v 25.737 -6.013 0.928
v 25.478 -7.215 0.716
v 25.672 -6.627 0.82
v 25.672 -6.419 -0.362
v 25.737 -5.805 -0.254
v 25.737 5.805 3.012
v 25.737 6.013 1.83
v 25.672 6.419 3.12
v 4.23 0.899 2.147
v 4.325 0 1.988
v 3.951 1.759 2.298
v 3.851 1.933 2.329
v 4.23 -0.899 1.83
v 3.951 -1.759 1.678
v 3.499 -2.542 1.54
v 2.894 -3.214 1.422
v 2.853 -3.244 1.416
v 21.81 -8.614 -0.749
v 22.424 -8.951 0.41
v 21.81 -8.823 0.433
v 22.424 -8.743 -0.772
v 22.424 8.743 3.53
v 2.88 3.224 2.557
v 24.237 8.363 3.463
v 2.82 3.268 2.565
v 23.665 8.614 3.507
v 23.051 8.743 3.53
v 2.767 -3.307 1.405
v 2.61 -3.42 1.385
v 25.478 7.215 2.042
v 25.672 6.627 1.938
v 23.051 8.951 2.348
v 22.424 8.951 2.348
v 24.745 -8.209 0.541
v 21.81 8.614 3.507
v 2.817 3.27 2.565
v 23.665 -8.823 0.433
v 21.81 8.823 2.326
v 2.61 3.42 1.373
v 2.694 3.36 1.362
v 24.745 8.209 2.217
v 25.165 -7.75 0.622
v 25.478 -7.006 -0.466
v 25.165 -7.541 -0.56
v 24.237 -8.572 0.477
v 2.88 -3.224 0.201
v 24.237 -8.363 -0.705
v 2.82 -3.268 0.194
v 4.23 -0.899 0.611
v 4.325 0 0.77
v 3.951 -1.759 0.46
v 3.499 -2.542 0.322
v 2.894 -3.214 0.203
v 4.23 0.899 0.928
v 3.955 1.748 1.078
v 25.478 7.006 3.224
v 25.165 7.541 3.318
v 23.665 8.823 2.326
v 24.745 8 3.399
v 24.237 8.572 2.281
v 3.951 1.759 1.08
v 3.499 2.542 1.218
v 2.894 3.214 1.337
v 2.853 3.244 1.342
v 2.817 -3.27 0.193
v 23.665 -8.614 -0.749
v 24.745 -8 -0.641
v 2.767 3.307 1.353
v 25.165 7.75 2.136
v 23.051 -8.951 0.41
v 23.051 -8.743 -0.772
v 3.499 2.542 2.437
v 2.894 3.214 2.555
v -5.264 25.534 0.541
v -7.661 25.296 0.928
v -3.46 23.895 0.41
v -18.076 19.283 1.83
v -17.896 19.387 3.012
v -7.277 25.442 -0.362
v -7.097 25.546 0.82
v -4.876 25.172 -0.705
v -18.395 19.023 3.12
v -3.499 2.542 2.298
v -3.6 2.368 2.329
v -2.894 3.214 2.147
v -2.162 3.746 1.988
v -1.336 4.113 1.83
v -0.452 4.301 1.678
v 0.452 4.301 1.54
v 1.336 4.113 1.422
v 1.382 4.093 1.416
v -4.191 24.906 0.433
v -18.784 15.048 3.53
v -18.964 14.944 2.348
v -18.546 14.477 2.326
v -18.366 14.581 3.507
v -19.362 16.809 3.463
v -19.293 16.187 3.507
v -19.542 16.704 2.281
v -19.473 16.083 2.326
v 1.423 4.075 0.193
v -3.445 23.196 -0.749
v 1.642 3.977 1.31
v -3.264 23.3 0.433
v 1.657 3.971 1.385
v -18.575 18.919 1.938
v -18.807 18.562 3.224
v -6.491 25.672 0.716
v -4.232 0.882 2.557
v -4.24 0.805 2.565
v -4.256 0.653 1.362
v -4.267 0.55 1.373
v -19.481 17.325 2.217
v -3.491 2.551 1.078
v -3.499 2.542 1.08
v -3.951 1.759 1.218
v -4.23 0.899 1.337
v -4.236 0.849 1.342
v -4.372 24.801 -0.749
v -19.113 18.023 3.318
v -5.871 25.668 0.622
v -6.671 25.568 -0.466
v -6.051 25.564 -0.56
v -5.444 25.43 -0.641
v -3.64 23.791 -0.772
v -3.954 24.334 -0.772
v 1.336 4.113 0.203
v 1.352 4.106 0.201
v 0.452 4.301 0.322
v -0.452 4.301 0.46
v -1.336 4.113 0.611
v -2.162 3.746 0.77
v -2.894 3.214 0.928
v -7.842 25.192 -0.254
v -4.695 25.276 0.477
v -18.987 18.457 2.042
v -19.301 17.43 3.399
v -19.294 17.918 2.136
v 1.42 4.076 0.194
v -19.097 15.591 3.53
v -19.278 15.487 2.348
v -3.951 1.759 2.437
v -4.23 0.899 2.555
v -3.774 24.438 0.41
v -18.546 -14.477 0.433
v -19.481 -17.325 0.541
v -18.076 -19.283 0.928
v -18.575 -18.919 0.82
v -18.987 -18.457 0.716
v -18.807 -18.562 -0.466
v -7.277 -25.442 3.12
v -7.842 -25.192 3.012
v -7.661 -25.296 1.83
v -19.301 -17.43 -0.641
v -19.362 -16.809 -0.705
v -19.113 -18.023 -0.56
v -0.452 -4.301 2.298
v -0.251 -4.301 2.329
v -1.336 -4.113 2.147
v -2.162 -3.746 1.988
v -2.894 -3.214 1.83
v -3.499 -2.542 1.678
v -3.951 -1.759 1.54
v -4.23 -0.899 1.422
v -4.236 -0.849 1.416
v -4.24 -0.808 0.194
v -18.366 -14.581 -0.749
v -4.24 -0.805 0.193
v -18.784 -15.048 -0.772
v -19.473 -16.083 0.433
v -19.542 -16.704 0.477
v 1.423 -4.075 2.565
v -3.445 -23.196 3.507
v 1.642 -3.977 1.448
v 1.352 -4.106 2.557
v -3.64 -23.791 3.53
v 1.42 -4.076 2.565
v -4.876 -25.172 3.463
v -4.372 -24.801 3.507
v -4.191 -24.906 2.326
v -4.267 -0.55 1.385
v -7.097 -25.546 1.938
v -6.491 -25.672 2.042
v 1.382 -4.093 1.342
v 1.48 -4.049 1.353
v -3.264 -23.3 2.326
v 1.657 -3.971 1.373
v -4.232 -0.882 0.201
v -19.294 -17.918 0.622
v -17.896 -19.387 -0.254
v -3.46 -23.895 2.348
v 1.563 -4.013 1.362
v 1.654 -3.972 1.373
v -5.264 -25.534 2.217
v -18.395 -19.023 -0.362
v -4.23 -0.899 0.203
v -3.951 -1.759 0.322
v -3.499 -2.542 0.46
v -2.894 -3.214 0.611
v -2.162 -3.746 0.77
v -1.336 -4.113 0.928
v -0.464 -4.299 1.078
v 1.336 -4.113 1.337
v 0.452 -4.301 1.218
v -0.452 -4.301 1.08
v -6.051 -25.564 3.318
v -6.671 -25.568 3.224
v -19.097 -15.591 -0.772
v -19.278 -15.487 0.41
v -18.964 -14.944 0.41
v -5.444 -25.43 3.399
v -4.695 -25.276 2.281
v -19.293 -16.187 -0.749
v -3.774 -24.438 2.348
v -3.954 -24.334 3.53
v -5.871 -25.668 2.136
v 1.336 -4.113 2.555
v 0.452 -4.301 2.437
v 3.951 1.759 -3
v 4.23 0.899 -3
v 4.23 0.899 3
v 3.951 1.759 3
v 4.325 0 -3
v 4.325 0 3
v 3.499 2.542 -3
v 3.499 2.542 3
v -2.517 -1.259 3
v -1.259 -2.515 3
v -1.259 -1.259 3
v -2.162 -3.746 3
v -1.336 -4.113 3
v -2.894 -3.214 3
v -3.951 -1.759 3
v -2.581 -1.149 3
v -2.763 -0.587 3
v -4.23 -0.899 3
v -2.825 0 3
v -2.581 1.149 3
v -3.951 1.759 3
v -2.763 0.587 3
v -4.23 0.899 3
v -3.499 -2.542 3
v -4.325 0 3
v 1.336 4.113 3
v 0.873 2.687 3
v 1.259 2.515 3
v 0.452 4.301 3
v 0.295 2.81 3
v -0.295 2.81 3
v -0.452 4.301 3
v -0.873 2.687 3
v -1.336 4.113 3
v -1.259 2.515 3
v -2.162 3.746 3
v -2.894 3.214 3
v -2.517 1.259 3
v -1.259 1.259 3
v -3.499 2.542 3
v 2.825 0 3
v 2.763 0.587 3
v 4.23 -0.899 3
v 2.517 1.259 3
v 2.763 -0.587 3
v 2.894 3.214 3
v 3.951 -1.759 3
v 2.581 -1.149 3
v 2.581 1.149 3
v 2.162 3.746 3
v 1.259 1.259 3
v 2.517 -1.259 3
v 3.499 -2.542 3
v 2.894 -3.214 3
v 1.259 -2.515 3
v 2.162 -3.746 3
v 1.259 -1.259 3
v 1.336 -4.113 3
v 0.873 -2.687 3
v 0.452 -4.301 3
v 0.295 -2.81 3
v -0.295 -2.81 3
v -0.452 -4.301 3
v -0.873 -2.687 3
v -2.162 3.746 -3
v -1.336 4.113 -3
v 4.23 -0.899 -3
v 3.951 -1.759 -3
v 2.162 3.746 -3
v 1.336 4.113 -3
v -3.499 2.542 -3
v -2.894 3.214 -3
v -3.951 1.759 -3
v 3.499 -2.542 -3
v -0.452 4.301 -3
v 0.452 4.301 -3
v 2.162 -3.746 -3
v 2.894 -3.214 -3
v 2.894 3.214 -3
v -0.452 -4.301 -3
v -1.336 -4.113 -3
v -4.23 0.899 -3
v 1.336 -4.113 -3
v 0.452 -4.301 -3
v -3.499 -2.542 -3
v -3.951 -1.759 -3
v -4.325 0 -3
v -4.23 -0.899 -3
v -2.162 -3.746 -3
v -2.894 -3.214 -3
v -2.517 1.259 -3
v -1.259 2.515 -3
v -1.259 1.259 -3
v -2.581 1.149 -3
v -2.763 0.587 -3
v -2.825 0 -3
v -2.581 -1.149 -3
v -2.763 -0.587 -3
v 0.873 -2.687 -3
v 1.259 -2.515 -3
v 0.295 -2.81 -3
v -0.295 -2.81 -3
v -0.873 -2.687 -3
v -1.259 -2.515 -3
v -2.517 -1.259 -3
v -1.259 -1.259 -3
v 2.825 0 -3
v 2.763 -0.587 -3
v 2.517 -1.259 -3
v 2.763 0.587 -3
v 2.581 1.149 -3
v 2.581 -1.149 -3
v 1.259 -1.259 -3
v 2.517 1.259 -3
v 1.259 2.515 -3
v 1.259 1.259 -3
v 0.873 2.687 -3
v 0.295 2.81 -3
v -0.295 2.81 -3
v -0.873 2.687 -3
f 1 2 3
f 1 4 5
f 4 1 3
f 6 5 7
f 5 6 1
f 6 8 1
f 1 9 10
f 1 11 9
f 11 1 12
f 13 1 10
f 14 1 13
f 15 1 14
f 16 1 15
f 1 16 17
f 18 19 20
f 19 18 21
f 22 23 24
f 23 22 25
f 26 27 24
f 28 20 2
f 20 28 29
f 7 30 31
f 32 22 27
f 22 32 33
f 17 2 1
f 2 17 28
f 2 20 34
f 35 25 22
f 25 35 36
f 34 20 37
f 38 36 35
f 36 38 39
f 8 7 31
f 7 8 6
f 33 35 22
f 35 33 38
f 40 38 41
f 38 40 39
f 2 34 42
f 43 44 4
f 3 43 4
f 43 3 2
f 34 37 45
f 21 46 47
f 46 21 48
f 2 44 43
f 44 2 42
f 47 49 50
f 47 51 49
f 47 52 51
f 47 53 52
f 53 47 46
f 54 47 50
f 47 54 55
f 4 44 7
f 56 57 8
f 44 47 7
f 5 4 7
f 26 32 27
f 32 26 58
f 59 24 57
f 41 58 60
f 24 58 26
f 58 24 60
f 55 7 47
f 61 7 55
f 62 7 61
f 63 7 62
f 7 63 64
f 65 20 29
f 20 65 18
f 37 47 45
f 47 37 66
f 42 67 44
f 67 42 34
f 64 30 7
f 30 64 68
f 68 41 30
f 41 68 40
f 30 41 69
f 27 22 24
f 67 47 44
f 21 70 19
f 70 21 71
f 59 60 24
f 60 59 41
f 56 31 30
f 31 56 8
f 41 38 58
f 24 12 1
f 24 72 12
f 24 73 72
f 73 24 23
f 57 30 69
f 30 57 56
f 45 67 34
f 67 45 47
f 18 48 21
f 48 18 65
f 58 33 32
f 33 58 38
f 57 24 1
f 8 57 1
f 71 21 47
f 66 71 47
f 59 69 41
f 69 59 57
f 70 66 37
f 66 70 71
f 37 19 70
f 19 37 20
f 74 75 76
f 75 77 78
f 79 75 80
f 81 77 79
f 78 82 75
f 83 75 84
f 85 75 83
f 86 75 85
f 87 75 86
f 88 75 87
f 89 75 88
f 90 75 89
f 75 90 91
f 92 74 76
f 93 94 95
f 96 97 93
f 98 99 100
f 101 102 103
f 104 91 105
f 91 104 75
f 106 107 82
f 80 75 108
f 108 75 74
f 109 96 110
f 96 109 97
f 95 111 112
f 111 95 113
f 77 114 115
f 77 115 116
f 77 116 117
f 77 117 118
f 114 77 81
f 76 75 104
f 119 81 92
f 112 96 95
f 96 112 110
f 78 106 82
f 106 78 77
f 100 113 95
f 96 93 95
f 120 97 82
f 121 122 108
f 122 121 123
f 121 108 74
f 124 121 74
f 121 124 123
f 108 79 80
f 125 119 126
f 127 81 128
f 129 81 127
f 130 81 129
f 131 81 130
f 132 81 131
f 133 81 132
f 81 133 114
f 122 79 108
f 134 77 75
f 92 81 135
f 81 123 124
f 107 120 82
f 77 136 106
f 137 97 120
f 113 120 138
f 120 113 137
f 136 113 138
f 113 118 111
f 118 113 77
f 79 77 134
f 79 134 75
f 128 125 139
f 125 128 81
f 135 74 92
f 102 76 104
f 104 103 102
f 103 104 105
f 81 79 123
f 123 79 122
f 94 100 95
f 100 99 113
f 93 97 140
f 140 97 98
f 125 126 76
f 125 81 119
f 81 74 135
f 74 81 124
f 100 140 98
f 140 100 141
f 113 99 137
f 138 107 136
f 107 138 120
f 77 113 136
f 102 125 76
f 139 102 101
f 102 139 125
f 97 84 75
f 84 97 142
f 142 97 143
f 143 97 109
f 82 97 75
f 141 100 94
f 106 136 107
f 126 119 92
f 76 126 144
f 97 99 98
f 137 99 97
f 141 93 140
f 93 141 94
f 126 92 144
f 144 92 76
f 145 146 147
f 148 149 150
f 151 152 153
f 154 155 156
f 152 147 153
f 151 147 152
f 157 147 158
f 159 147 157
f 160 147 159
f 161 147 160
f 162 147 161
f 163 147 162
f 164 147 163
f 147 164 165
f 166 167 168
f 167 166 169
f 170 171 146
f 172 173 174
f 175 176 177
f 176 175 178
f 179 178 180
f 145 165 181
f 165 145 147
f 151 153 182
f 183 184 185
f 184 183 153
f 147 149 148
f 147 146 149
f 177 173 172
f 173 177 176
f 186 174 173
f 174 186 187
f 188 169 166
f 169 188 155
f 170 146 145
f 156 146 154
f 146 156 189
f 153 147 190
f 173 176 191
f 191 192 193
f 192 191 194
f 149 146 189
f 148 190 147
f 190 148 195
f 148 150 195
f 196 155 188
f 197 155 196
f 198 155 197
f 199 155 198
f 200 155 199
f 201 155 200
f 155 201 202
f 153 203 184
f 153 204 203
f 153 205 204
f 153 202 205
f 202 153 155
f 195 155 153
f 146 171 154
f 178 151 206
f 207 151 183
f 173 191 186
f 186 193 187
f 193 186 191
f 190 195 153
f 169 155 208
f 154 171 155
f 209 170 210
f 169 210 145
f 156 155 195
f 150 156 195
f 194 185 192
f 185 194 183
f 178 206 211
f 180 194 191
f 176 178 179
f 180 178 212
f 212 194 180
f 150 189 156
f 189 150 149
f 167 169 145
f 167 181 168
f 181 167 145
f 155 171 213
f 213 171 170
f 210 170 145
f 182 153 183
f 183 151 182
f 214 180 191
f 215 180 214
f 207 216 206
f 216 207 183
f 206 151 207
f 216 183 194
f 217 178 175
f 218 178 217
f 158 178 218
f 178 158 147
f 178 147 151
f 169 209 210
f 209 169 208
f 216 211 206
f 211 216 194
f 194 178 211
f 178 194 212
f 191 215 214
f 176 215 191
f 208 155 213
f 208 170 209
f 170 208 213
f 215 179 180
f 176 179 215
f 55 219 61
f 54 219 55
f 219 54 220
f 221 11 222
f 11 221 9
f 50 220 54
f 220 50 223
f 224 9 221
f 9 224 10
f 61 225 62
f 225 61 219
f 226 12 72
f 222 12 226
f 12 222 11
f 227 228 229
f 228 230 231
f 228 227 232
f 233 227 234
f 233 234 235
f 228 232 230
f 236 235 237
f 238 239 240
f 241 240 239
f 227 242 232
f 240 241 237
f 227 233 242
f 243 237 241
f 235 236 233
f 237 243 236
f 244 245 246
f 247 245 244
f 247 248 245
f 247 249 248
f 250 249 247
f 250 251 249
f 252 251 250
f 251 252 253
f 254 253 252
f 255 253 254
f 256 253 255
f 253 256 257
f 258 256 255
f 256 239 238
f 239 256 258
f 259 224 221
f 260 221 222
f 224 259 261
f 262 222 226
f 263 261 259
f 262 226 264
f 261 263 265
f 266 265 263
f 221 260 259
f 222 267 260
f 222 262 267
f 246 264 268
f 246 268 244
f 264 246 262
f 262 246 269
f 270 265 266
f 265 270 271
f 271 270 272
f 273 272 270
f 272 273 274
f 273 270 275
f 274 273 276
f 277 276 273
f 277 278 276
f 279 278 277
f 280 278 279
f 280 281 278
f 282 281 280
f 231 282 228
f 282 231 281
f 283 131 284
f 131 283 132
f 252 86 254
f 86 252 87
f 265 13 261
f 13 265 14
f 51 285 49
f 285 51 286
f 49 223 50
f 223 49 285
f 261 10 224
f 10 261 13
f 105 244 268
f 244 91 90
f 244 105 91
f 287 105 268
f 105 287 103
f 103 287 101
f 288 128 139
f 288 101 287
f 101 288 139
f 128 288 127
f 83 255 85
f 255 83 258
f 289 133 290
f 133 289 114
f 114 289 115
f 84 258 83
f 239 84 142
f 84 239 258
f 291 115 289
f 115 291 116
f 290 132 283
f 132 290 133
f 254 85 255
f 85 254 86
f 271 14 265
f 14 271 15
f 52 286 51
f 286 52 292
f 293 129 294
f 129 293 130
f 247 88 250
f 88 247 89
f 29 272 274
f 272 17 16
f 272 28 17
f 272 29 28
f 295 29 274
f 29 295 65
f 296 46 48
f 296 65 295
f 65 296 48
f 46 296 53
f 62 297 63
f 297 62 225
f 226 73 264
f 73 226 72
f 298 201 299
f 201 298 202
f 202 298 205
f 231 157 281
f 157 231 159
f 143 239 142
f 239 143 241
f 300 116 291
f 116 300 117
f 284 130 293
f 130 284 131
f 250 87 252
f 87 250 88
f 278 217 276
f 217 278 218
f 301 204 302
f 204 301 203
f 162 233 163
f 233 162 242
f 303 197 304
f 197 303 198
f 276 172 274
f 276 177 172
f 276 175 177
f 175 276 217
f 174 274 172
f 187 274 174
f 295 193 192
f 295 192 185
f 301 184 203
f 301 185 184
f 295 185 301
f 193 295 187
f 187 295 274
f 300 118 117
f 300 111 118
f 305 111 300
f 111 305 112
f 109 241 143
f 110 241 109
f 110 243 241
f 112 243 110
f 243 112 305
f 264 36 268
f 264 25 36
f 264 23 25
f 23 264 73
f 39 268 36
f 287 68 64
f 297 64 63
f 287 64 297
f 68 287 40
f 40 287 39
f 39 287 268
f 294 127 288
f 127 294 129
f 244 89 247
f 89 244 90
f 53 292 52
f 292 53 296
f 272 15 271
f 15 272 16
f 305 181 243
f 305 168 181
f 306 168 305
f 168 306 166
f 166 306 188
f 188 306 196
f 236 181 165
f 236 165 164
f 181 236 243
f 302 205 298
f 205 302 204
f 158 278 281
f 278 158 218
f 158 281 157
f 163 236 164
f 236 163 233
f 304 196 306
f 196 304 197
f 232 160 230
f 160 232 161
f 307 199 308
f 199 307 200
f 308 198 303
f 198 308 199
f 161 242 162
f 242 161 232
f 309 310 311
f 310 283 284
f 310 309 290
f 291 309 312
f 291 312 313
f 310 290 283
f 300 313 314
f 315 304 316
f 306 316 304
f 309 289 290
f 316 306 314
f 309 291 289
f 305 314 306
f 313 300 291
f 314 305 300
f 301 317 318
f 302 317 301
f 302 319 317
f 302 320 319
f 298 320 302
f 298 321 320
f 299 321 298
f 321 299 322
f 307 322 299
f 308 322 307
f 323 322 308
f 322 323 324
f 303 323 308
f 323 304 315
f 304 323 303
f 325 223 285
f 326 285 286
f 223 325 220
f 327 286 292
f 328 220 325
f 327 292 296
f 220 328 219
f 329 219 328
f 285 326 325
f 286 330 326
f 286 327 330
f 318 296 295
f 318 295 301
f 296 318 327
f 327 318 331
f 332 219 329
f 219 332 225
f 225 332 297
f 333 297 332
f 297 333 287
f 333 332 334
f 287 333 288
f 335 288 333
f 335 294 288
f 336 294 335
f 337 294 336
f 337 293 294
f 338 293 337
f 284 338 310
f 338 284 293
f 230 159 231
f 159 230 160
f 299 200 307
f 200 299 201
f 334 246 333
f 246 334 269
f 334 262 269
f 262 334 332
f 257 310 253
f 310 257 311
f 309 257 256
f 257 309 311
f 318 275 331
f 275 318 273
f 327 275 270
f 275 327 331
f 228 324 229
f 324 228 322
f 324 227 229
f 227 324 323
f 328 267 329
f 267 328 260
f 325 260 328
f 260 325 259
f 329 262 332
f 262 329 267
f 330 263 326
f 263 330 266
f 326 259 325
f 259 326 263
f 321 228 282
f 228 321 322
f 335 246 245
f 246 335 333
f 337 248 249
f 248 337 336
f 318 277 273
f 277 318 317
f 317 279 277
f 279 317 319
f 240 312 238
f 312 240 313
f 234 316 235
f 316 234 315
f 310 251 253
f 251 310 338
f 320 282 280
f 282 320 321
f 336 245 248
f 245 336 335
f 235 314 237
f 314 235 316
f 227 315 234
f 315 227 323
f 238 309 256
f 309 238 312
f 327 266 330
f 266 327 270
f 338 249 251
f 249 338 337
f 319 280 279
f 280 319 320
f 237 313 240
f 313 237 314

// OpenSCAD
/* [General Blade Controls] */
// type of blade
bladeType = "rudder"; // [smooth,rudder,impeller,helicopter]
// diameter of the entire propeller
bladeOD = 65;
// how many blades
numBlades = 3;
// pitch angle of the blades, set to negative to change direction
bladePitch = 10; // [0:1:90]
// width of the blades
bladeWidth = 6;
// thickness of the propeller blades
bladeThickness = 1.2;
// ratio of rudder expansion
rudderEndWidthMod = 2;

/* [Helicopter Blade Controls] */
// how flat are the helicopter blades
heliBladeZScale = .4; // [0:0.1:1]
// position of blade loft division
heliPortionRatio = 0.1; // [0:0.1:1]
// amount of tapering
heliEndScale = 2.2; // [2:0.2:10]
// style of helicopter blade tips (WIP No Function)
// heliBladeTip = "none"; // [none,pointed,rounded]

/* [Shaft Controls] */
// choose either a cross or a peg connector fitting
fittingType = "cross"; // [peg,cross,maleCrossTop,maleCrossBottom]
// type of shaft topper. Note: not all combinations of toppers will work with the shafts
shaftTopper = "none"; // [none,rounded,flat,stud,female,cross,peg]
// shaft wall thickness
propellerShaftOffset = 3;
// distance from propellers to the top of the shaft
bladeHeightOffset = 0.5;
// height of the propeller shaft
shaftHeight = 6;
// thickness of the topper thickness, set to 0 for no separator
shaftTopSeparator = 1;



/* [Peg Fitting Controls] */ 
// ID of the peg connector, don't change these settings unless you're trying to adjust the peg connector fitting
pegID = 5.25;
// wall thickness of peg connector offset
pegShaftWall = 1;
// don't change this unless you're adjusting the connector, this is the depth of the connector
pegHeight = 5;
// height of the connector fitting's rim
pegRimHeight = 1;
// wall thickness of the rim
pegRimIDOffset = 0.7;

/* [Cross Fitting Controls] */
// Overall cross fitting diameter: increase this number to loosen and lower to tighten the cross beam fittings. Adjust these 2 numbers accordingly, each printer will have different settings for a good fit just tinker til you get it
xFitDiameter = 5.65;
// Cross beam thickness cutting profile: increase this number to tighten and lower to loosen the cross beam fittings
xFitAxleBeams = 1.95;

/* [Male Cross Beam Controls] */
// can be a number
// roundedAdjust = xFitDiameter/2;
roundedAdjust = xFitDiameter/3.1;
// modifier for making cross beam males, the sizing difference from females, a negative number will make the males smaller and a positive number will makes the males larger
xFitAdjust = 0.1;
// length of male 
maleLength = 7;

// male Cross beam calculations
xFitAxleBeams2 = 3.4 + xFitAdjust;
xFitDiameter2 = 5.0 + xFitAdjust;

// calculations
propShaftOD = xFitDiameter + propellerShaftOffset;
propShaftOr = propShaftOD/2;
bladeOr = bladeOD/2 - propShaftOr;

// peg calculations
pegOr = pegID/2 + pegShaftWall;
pegIr = pegID/2;


module pegMale() {

}

module propeller2() {
	$fn = 30;
	align = 2.234;	
	// shaft build
	difference() {
		// shaft OD
		union() {
			cylinder(h = shaftHeight, r = propShaftOr,center = true);
			for (i = [0:numBlades]) {
				rotate([0,0,i*360/numBlades]) {
					// translate([0,0,-(bladeWidth*sin(bladePitch)/2)])
					if (bladeType == "smooth") {
						translate([0,0,-(bladeWidth*sin(bladePitch)/2)])
						roundedProp2();
					} else if (bladeType == "rudder") {
						translate([0,0,-(bladeWidth*sin(bladePitch)/2)])
						rudder();
					} else if (bladeType == "impeller") {
						// translate([0,0,(bladeWidth*sin(bladePitch)/2)])
						impellerBlades();
					} else if (bladeType =="helicopter") {
						translate([0,propShaftOr + bladeOr/2 - 0.5,0])
						helicopterBlades();
					}
				}
			}

			// male cross union add-on
			if (fittingType == "maleCrossTop") {
				rotate([180,0,0])
				translate([0,0,-maleLength/2])
				crossProfileMale(shaftHeight + maleLength);
			} else if (fittingType == "maleCrossBottom") {
				rotate([0,0,0])
				translate([0,0,-maleLength/2])
				crossProfileMale(shaftHeight + maleLength);
			}

			// shaft topper
			translate([0,0,(shaftHeight + shaftTopSeparator)/2])
			shaftTopper();
		}
		// shaft cross cutout
		if (fittingType == "cross") {
			difference() {
				cylinder(h = shaftHeight*1.01, r = xFitDiameter/2,center = true);
				crossProfile(shaftHeight*1.00);
			}
		} else if (fittingType == "peg") {
			union() {
				$fn = 90;
				cylinder(h = shaftHeight*2, r = pegIr, center = true);

				translate([0,0,(shaftHeight + pegHeight)/2])
				cylinder(h = shaftHeight, r = pegOr, center = true);
			}
		} 
	}
}

module shaftTopper() {
	if (shaftTopper == "flat") {
		cylinder(h = shaftTopSeparator, r = propShaftOr, center = true);
	} else if (shaftTopper == "rounded") {
		cylinder(h = shaftTopSeparator, r = propShaftOr, center = true);
		translate([0,0,shaftTopSeparator/2]) {
			difference() {
				sphere(propShaftOr,true);
				translate([0,0,-propShaftOr])
				cube(propShaftOD,true);
			}
		}
	} else if (shaftTopper == "cross") {
		cylinder(h = shaftTopSeparator, r = propShaftOr, center = true);
		translate([0,0,shaftTopSeparator/2]) {
			crossProfile(shaftHeight);
		}
	}
}

module crossProfile(height) {
	align = 2.234;	
	// shaft build
	difference() {
	// shaft OD
		union() {
	
			cylinder(h = height, r = propShaftOr,center = true);
		}
		// shaft cross cutout
		difference() {
			// actual x Profile that'll act as the cutting tool
			cylinder(h = height + 0.01, r = xFitDiameter/2,center = true);
			union() {
				translate([align,align,0])
				cube([xFitAxleBeams, xFitAxleBeams, height+0.02],true);

				translate([-align,align,0])
				cube([xFitAxleBeams, xFitAxleBeams, height+0.02],true);

				translate([align,-align,0])
				cube([xFitAxleBeams, xFitAxleBeams, height+0.02],true);

				translate([-align,-align,0])
				cube([xFitAxleBeams, xFitAxleBeams, height+0.02],true);
			}
		}	
	}
}



module crossProfileMale(height) {
	align = 2.234;	
	$fn = 30;
	// rotate([180,0,0])
	difference() {
	// cross beam
		difference() {
		// actual x Profile that'll act as the cutting tool
			cylinder(h = height + 0.01, r = xFitDiameter2/2,center = true);
			union() {
				translate([align,align,0])
				cube([xFitAxleBeams2, xFitAxleBeams2, height+0.02],true);
	
				translate([-align,align,0])
				cube([xFitAxleBeams2, xFitAxleBeams2, height+0.02],true);
	
				translate([align,-align,0])
				cube([xFitAxleBeams2, xFitAxleBeams2, height+0.02],true);
	
				translate([-align,-align,0])
				cube([xFitAxleBeams2, xFitAxleBeams2, height+0.02],true);
			}
		}

		// rounded ends
		translate([0,0,-height/2 + roundedAdjust])
		difference() {
			$fn = 50;
			// building cutting tool
			translate([0,0,-xFitDiameter2/2])
			cube(xFitDiameter2,true);
			sphere(xFitDiameter2/2,true);

		}	
	}
}

module roundedProp2() {
	zMove = shaftHeight/2 - bladeHeightOffset - bladeThickness/2;
	translate([bladeOr/2,0,zMove])
	rotate([bladePitch,0,0])
	union() {
		translate([bladeOr/2,0])
		cylinder(h = bladeThickness, r = bladeWidth/2, center = true);
		cube([bladeOr,bladeWidth,bladeThickness],true);
	}
}

module rudder() {
	zMove = shaftHeight/2 - bladeHeightOffset - bladeThickness/2;
	translate([propShaftOD/2,0,zMove])
	rotate([bladePitch,0,0])
	hull() {
		translate([bladeOr/2 + propShaftOr,-bladeWidth*rudderEndWidthMod/2,0])
		cylinder(h = bladeThickness, r = bladeWidth/2, center = true);
		translate([bladeOr/2 + propShaftOr,bladeWidth*rudderEndWidthMod/2,0])
		cylinder(h = bladeThickness, r = bladeWidth/2, center = true);

		cube([bladeWidth,bladeWidth,bladeThickness],true);
	}
}

module impellerBlades() {
	linear_extrude(height = shaftHeight, center = true, twist = bladePitch, slices = 10)
	translate([(propShaftOr + bladeOr/2) - 0.1,0])
	square([bladeOr,bladeThickness],true);
	// circle(propShaftOr,true);
}

module helicopterBlades() {
	$fn = 15;
	upperPortion = 1 - heliPortionRatio; // 0.7
	lowerPortion = heliPortionRatio; // 0.3
	translate([0,bladeOr*lowerPortion/2,0])
	rotate([90,bladePitch,0])
	resize([bladeWidth,bladeWidth*heliBladeZScale,bladeOr + 0.5])
	union() {
		cylinder(h = bladeOr*upperPortion, r1 = bladeThickness/heliEndScale, r2 = bladeThickness, center = true);
		translate([0,0,bladeOr/2])
		cylinder(h = bladeOr*lowerPortion, r2 = bladeThickness/heliEndScale, r1 = bladeThickness, center = true);
	}
}


propeller2();
